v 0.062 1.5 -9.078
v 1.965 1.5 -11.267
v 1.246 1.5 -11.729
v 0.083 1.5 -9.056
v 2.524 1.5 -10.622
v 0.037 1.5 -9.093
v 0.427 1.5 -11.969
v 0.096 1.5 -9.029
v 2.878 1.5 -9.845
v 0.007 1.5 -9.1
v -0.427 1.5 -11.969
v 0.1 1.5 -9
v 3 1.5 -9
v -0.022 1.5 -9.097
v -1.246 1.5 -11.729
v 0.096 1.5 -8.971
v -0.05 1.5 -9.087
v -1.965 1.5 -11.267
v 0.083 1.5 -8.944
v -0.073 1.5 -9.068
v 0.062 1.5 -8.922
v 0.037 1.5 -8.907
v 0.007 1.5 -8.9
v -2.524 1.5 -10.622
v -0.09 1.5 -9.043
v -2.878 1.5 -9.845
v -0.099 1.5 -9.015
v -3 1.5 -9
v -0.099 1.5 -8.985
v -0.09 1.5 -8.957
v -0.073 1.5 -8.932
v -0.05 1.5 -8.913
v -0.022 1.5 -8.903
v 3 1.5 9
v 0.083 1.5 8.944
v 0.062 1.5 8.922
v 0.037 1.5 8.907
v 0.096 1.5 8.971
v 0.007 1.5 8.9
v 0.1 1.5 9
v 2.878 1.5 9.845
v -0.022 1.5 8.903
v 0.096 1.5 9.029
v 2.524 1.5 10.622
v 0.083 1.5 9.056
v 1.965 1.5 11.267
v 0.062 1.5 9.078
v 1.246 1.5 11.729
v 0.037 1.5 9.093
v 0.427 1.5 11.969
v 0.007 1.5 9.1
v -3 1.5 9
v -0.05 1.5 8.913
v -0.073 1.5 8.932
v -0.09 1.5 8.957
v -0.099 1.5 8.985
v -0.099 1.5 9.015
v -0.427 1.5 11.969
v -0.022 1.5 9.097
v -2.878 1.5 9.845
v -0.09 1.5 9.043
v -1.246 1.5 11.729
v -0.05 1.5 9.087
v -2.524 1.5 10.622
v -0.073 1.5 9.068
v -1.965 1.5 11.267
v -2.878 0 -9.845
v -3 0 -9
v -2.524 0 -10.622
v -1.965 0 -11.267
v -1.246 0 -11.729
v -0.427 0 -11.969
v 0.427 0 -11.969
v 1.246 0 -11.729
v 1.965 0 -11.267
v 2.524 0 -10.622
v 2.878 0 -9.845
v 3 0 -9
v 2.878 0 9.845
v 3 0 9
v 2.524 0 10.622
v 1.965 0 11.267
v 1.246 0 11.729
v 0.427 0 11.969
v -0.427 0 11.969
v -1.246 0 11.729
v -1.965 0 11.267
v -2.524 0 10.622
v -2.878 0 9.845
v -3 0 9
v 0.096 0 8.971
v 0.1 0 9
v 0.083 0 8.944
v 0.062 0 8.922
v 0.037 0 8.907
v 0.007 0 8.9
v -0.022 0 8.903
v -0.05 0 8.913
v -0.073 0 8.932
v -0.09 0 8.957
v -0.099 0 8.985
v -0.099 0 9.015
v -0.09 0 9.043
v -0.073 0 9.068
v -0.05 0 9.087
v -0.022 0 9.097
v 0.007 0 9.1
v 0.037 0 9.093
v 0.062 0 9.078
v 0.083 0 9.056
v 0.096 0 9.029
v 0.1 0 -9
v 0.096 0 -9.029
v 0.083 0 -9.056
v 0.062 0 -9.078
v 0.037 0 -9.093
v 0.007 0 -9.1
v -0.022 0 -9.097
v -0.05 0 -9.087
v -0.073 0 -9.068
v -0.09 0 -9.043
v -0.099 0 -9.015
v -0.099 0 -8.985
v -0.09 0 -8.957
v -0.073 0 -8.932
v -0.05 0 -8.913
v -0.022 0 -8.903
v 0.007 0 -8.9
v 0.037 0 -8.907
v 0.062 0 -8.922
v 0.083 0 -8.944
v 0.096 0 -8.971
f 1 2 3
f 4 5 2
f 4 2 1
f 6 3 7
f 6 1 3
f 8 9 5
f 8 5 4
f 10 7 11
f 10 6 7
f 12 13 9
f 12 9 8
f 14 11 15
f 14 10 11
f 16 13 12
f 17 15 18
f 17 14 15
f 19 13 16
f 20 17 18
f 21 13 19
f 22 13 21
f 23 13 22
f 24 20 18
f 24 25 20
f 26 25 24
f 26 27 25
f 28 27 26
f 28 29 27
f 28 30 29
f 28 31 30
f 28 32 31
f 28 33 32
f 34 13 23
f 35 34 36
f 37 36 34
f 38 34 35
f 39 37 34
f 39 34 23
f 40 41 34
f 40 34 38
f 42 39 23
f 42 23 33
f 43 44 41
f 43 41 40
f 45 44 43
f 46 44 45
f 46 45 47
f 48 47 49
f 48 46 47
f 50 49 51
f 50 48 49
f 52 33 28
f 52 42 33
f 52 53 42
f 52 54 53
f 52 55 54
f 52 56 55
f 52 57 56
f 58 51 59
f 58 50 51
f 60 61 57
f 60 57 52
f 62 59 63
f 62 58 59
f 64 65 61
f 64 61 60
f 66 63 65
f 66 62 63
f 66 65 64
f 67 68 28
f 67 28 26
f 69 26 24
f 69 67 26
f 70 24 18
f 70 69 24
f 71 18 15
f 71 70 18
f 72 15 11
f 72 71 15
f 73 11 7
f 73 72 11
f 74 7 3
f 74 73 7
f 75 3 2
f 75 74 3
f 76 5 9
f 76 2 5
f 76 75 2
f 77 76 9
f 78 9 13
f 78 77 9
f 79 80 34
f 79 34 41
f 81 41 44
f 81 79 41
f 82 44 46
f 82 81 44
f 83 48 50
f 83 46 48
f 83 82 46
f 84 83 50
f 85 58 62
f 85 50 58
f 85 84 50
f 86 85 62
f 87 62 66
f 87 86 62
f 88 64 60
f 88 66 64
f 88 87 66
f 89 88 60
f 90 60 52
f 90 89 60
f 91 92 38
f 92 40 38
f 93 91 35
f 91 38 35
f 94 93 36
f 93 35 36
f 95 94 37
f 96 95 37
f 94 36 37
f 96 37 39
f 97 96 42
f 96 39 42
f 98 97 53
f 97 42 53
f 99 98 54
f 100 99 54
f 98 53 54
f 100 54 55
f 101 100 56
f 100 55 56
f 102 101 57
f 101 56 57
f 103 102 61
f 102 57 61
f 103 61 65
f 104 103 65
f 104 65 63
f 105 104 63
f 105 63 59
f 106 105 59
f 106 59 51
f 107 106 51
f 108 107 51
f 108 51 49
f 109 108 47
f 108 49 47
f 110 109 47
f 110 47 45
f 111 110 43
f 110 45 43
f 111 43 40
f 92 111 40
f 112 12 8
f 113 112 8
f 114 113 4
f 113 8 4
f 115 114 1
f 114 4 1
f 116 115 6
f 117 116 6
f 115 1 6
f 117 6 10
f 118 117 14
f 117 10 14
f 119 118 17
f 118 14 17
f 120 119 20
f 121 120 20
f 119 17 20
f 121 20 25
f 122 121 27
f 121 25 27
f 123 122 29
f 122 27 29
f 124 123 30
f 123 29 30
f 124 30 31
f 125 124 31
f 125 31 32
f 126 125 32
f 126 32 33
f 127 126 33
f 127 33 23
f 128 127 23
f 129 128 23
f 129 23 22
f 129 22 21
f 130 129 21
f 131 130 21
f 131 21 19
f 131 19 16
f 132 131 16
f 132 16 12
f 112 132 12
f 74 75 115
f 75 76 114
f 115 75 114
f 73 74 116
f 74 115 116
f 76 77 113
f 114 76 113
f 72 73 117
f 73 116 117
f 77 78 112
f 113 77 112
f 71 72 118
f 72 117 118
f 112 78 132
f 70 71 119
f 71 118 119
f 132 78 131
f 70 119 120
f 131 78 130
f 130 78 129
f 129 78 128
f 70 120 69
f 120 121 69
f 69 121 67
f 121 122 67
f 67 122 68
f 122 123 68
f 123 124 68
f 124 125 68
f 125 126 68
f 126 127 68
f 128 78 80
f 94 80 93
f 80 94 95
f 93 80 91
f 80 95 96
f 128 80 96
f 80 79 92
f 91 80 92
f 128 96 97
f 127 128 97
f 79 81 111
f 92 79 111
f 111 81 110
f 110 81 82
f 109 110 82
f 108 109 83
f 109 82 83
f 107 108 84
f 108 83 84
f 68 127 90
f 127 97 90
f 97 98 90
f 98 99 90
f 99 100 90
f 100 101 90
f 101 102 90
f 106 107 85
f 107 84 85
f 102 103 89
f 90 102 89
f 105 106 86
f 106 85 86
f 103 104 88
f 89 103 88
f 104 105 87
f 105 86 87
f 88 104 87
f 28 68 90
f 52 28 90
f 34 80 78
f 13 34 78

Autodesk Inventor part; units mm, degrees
ref_plane "YZ Plane" through (0, 0, 0) normal (1, 0, 0) x (0, 1, 0)
ref_plane "XZ Plane" through (0, 0, 0) normal (0, 1, 0) x (-1, 0, 0)
ref_plane "XY Plane" through (0, 0, 0) normal (0, 0, 1) x (1, 0, 0)
sketch "Sketch1" plane through (0, 0, 0) normal (0, 1, 0) x (-1, 0, 0)
  line L0 (-3, -9) -> (3, -9)
  line L1 (3, -9) -> (3, 9)
  line L2 (3, 9) -> (-3, 9)
  line L3 (-3, 9) -> (-3, -9)
  line L4 (-3, -9) -> (3, 9) construction
  line L5 (3, -9) -> (-3, 9) construction
  circle A0 centre (0, -9) radius 3
  circle A1 centre (0, 9) radius 3
  point P0 (0, 0)
  dimension "d0" = 6
  dimension "d1" = 18
  dimension "d2" = 6
extrude "Extrusion1" add sketch "Sketch1" along normal blind 1.5
sketch "Sketch2" plane through (0, 1.5, 0) normal (0, 1, 0) x (1, 0, 0)
  arc A0 (-3, -9) -> (3, -9) centre (0, -9) ccw projected
  arc A1 (3, 9) -> (-3, 9) centre (0, 9) ccw projected
  circle A2 centre (0, 9) radius 1.5
  circle A3 centre (0, -9) radius 1.5
  point P0 (0, 0)
  dimension "d5" = 3
  dimension "d6" = 3
extrude "Extrusion2" cut sketch "Sketch2" against normal blind 2
sketch "Sketch7" plane through (0, 1.5, 0) normal (0, 1, 0) x (1, 0, 0)
  circle A0 centre (0, 9) radius 1.5 projected
  circle A1 centre (0, -9) radius 1.5 projected
  arc A2 (-3, -9) -> (3, -9) centre (0, -9) ccw projected
  arc A3 (3, 9) -> (-3, 9) centre (0, 9) ccw projected
  circle A4 centre (0, 9) radius 0.1
  circle A5 centre (0, -9) radius 0.1
  point P0 (0, 0)
  dimension "d13" = 0.2
  dimension "d14" = 0.2
extrude "Extrusion3" add sketch "Sketch7" against normal blind 1.5
properties part number "ruka_tahlo_sablona"
